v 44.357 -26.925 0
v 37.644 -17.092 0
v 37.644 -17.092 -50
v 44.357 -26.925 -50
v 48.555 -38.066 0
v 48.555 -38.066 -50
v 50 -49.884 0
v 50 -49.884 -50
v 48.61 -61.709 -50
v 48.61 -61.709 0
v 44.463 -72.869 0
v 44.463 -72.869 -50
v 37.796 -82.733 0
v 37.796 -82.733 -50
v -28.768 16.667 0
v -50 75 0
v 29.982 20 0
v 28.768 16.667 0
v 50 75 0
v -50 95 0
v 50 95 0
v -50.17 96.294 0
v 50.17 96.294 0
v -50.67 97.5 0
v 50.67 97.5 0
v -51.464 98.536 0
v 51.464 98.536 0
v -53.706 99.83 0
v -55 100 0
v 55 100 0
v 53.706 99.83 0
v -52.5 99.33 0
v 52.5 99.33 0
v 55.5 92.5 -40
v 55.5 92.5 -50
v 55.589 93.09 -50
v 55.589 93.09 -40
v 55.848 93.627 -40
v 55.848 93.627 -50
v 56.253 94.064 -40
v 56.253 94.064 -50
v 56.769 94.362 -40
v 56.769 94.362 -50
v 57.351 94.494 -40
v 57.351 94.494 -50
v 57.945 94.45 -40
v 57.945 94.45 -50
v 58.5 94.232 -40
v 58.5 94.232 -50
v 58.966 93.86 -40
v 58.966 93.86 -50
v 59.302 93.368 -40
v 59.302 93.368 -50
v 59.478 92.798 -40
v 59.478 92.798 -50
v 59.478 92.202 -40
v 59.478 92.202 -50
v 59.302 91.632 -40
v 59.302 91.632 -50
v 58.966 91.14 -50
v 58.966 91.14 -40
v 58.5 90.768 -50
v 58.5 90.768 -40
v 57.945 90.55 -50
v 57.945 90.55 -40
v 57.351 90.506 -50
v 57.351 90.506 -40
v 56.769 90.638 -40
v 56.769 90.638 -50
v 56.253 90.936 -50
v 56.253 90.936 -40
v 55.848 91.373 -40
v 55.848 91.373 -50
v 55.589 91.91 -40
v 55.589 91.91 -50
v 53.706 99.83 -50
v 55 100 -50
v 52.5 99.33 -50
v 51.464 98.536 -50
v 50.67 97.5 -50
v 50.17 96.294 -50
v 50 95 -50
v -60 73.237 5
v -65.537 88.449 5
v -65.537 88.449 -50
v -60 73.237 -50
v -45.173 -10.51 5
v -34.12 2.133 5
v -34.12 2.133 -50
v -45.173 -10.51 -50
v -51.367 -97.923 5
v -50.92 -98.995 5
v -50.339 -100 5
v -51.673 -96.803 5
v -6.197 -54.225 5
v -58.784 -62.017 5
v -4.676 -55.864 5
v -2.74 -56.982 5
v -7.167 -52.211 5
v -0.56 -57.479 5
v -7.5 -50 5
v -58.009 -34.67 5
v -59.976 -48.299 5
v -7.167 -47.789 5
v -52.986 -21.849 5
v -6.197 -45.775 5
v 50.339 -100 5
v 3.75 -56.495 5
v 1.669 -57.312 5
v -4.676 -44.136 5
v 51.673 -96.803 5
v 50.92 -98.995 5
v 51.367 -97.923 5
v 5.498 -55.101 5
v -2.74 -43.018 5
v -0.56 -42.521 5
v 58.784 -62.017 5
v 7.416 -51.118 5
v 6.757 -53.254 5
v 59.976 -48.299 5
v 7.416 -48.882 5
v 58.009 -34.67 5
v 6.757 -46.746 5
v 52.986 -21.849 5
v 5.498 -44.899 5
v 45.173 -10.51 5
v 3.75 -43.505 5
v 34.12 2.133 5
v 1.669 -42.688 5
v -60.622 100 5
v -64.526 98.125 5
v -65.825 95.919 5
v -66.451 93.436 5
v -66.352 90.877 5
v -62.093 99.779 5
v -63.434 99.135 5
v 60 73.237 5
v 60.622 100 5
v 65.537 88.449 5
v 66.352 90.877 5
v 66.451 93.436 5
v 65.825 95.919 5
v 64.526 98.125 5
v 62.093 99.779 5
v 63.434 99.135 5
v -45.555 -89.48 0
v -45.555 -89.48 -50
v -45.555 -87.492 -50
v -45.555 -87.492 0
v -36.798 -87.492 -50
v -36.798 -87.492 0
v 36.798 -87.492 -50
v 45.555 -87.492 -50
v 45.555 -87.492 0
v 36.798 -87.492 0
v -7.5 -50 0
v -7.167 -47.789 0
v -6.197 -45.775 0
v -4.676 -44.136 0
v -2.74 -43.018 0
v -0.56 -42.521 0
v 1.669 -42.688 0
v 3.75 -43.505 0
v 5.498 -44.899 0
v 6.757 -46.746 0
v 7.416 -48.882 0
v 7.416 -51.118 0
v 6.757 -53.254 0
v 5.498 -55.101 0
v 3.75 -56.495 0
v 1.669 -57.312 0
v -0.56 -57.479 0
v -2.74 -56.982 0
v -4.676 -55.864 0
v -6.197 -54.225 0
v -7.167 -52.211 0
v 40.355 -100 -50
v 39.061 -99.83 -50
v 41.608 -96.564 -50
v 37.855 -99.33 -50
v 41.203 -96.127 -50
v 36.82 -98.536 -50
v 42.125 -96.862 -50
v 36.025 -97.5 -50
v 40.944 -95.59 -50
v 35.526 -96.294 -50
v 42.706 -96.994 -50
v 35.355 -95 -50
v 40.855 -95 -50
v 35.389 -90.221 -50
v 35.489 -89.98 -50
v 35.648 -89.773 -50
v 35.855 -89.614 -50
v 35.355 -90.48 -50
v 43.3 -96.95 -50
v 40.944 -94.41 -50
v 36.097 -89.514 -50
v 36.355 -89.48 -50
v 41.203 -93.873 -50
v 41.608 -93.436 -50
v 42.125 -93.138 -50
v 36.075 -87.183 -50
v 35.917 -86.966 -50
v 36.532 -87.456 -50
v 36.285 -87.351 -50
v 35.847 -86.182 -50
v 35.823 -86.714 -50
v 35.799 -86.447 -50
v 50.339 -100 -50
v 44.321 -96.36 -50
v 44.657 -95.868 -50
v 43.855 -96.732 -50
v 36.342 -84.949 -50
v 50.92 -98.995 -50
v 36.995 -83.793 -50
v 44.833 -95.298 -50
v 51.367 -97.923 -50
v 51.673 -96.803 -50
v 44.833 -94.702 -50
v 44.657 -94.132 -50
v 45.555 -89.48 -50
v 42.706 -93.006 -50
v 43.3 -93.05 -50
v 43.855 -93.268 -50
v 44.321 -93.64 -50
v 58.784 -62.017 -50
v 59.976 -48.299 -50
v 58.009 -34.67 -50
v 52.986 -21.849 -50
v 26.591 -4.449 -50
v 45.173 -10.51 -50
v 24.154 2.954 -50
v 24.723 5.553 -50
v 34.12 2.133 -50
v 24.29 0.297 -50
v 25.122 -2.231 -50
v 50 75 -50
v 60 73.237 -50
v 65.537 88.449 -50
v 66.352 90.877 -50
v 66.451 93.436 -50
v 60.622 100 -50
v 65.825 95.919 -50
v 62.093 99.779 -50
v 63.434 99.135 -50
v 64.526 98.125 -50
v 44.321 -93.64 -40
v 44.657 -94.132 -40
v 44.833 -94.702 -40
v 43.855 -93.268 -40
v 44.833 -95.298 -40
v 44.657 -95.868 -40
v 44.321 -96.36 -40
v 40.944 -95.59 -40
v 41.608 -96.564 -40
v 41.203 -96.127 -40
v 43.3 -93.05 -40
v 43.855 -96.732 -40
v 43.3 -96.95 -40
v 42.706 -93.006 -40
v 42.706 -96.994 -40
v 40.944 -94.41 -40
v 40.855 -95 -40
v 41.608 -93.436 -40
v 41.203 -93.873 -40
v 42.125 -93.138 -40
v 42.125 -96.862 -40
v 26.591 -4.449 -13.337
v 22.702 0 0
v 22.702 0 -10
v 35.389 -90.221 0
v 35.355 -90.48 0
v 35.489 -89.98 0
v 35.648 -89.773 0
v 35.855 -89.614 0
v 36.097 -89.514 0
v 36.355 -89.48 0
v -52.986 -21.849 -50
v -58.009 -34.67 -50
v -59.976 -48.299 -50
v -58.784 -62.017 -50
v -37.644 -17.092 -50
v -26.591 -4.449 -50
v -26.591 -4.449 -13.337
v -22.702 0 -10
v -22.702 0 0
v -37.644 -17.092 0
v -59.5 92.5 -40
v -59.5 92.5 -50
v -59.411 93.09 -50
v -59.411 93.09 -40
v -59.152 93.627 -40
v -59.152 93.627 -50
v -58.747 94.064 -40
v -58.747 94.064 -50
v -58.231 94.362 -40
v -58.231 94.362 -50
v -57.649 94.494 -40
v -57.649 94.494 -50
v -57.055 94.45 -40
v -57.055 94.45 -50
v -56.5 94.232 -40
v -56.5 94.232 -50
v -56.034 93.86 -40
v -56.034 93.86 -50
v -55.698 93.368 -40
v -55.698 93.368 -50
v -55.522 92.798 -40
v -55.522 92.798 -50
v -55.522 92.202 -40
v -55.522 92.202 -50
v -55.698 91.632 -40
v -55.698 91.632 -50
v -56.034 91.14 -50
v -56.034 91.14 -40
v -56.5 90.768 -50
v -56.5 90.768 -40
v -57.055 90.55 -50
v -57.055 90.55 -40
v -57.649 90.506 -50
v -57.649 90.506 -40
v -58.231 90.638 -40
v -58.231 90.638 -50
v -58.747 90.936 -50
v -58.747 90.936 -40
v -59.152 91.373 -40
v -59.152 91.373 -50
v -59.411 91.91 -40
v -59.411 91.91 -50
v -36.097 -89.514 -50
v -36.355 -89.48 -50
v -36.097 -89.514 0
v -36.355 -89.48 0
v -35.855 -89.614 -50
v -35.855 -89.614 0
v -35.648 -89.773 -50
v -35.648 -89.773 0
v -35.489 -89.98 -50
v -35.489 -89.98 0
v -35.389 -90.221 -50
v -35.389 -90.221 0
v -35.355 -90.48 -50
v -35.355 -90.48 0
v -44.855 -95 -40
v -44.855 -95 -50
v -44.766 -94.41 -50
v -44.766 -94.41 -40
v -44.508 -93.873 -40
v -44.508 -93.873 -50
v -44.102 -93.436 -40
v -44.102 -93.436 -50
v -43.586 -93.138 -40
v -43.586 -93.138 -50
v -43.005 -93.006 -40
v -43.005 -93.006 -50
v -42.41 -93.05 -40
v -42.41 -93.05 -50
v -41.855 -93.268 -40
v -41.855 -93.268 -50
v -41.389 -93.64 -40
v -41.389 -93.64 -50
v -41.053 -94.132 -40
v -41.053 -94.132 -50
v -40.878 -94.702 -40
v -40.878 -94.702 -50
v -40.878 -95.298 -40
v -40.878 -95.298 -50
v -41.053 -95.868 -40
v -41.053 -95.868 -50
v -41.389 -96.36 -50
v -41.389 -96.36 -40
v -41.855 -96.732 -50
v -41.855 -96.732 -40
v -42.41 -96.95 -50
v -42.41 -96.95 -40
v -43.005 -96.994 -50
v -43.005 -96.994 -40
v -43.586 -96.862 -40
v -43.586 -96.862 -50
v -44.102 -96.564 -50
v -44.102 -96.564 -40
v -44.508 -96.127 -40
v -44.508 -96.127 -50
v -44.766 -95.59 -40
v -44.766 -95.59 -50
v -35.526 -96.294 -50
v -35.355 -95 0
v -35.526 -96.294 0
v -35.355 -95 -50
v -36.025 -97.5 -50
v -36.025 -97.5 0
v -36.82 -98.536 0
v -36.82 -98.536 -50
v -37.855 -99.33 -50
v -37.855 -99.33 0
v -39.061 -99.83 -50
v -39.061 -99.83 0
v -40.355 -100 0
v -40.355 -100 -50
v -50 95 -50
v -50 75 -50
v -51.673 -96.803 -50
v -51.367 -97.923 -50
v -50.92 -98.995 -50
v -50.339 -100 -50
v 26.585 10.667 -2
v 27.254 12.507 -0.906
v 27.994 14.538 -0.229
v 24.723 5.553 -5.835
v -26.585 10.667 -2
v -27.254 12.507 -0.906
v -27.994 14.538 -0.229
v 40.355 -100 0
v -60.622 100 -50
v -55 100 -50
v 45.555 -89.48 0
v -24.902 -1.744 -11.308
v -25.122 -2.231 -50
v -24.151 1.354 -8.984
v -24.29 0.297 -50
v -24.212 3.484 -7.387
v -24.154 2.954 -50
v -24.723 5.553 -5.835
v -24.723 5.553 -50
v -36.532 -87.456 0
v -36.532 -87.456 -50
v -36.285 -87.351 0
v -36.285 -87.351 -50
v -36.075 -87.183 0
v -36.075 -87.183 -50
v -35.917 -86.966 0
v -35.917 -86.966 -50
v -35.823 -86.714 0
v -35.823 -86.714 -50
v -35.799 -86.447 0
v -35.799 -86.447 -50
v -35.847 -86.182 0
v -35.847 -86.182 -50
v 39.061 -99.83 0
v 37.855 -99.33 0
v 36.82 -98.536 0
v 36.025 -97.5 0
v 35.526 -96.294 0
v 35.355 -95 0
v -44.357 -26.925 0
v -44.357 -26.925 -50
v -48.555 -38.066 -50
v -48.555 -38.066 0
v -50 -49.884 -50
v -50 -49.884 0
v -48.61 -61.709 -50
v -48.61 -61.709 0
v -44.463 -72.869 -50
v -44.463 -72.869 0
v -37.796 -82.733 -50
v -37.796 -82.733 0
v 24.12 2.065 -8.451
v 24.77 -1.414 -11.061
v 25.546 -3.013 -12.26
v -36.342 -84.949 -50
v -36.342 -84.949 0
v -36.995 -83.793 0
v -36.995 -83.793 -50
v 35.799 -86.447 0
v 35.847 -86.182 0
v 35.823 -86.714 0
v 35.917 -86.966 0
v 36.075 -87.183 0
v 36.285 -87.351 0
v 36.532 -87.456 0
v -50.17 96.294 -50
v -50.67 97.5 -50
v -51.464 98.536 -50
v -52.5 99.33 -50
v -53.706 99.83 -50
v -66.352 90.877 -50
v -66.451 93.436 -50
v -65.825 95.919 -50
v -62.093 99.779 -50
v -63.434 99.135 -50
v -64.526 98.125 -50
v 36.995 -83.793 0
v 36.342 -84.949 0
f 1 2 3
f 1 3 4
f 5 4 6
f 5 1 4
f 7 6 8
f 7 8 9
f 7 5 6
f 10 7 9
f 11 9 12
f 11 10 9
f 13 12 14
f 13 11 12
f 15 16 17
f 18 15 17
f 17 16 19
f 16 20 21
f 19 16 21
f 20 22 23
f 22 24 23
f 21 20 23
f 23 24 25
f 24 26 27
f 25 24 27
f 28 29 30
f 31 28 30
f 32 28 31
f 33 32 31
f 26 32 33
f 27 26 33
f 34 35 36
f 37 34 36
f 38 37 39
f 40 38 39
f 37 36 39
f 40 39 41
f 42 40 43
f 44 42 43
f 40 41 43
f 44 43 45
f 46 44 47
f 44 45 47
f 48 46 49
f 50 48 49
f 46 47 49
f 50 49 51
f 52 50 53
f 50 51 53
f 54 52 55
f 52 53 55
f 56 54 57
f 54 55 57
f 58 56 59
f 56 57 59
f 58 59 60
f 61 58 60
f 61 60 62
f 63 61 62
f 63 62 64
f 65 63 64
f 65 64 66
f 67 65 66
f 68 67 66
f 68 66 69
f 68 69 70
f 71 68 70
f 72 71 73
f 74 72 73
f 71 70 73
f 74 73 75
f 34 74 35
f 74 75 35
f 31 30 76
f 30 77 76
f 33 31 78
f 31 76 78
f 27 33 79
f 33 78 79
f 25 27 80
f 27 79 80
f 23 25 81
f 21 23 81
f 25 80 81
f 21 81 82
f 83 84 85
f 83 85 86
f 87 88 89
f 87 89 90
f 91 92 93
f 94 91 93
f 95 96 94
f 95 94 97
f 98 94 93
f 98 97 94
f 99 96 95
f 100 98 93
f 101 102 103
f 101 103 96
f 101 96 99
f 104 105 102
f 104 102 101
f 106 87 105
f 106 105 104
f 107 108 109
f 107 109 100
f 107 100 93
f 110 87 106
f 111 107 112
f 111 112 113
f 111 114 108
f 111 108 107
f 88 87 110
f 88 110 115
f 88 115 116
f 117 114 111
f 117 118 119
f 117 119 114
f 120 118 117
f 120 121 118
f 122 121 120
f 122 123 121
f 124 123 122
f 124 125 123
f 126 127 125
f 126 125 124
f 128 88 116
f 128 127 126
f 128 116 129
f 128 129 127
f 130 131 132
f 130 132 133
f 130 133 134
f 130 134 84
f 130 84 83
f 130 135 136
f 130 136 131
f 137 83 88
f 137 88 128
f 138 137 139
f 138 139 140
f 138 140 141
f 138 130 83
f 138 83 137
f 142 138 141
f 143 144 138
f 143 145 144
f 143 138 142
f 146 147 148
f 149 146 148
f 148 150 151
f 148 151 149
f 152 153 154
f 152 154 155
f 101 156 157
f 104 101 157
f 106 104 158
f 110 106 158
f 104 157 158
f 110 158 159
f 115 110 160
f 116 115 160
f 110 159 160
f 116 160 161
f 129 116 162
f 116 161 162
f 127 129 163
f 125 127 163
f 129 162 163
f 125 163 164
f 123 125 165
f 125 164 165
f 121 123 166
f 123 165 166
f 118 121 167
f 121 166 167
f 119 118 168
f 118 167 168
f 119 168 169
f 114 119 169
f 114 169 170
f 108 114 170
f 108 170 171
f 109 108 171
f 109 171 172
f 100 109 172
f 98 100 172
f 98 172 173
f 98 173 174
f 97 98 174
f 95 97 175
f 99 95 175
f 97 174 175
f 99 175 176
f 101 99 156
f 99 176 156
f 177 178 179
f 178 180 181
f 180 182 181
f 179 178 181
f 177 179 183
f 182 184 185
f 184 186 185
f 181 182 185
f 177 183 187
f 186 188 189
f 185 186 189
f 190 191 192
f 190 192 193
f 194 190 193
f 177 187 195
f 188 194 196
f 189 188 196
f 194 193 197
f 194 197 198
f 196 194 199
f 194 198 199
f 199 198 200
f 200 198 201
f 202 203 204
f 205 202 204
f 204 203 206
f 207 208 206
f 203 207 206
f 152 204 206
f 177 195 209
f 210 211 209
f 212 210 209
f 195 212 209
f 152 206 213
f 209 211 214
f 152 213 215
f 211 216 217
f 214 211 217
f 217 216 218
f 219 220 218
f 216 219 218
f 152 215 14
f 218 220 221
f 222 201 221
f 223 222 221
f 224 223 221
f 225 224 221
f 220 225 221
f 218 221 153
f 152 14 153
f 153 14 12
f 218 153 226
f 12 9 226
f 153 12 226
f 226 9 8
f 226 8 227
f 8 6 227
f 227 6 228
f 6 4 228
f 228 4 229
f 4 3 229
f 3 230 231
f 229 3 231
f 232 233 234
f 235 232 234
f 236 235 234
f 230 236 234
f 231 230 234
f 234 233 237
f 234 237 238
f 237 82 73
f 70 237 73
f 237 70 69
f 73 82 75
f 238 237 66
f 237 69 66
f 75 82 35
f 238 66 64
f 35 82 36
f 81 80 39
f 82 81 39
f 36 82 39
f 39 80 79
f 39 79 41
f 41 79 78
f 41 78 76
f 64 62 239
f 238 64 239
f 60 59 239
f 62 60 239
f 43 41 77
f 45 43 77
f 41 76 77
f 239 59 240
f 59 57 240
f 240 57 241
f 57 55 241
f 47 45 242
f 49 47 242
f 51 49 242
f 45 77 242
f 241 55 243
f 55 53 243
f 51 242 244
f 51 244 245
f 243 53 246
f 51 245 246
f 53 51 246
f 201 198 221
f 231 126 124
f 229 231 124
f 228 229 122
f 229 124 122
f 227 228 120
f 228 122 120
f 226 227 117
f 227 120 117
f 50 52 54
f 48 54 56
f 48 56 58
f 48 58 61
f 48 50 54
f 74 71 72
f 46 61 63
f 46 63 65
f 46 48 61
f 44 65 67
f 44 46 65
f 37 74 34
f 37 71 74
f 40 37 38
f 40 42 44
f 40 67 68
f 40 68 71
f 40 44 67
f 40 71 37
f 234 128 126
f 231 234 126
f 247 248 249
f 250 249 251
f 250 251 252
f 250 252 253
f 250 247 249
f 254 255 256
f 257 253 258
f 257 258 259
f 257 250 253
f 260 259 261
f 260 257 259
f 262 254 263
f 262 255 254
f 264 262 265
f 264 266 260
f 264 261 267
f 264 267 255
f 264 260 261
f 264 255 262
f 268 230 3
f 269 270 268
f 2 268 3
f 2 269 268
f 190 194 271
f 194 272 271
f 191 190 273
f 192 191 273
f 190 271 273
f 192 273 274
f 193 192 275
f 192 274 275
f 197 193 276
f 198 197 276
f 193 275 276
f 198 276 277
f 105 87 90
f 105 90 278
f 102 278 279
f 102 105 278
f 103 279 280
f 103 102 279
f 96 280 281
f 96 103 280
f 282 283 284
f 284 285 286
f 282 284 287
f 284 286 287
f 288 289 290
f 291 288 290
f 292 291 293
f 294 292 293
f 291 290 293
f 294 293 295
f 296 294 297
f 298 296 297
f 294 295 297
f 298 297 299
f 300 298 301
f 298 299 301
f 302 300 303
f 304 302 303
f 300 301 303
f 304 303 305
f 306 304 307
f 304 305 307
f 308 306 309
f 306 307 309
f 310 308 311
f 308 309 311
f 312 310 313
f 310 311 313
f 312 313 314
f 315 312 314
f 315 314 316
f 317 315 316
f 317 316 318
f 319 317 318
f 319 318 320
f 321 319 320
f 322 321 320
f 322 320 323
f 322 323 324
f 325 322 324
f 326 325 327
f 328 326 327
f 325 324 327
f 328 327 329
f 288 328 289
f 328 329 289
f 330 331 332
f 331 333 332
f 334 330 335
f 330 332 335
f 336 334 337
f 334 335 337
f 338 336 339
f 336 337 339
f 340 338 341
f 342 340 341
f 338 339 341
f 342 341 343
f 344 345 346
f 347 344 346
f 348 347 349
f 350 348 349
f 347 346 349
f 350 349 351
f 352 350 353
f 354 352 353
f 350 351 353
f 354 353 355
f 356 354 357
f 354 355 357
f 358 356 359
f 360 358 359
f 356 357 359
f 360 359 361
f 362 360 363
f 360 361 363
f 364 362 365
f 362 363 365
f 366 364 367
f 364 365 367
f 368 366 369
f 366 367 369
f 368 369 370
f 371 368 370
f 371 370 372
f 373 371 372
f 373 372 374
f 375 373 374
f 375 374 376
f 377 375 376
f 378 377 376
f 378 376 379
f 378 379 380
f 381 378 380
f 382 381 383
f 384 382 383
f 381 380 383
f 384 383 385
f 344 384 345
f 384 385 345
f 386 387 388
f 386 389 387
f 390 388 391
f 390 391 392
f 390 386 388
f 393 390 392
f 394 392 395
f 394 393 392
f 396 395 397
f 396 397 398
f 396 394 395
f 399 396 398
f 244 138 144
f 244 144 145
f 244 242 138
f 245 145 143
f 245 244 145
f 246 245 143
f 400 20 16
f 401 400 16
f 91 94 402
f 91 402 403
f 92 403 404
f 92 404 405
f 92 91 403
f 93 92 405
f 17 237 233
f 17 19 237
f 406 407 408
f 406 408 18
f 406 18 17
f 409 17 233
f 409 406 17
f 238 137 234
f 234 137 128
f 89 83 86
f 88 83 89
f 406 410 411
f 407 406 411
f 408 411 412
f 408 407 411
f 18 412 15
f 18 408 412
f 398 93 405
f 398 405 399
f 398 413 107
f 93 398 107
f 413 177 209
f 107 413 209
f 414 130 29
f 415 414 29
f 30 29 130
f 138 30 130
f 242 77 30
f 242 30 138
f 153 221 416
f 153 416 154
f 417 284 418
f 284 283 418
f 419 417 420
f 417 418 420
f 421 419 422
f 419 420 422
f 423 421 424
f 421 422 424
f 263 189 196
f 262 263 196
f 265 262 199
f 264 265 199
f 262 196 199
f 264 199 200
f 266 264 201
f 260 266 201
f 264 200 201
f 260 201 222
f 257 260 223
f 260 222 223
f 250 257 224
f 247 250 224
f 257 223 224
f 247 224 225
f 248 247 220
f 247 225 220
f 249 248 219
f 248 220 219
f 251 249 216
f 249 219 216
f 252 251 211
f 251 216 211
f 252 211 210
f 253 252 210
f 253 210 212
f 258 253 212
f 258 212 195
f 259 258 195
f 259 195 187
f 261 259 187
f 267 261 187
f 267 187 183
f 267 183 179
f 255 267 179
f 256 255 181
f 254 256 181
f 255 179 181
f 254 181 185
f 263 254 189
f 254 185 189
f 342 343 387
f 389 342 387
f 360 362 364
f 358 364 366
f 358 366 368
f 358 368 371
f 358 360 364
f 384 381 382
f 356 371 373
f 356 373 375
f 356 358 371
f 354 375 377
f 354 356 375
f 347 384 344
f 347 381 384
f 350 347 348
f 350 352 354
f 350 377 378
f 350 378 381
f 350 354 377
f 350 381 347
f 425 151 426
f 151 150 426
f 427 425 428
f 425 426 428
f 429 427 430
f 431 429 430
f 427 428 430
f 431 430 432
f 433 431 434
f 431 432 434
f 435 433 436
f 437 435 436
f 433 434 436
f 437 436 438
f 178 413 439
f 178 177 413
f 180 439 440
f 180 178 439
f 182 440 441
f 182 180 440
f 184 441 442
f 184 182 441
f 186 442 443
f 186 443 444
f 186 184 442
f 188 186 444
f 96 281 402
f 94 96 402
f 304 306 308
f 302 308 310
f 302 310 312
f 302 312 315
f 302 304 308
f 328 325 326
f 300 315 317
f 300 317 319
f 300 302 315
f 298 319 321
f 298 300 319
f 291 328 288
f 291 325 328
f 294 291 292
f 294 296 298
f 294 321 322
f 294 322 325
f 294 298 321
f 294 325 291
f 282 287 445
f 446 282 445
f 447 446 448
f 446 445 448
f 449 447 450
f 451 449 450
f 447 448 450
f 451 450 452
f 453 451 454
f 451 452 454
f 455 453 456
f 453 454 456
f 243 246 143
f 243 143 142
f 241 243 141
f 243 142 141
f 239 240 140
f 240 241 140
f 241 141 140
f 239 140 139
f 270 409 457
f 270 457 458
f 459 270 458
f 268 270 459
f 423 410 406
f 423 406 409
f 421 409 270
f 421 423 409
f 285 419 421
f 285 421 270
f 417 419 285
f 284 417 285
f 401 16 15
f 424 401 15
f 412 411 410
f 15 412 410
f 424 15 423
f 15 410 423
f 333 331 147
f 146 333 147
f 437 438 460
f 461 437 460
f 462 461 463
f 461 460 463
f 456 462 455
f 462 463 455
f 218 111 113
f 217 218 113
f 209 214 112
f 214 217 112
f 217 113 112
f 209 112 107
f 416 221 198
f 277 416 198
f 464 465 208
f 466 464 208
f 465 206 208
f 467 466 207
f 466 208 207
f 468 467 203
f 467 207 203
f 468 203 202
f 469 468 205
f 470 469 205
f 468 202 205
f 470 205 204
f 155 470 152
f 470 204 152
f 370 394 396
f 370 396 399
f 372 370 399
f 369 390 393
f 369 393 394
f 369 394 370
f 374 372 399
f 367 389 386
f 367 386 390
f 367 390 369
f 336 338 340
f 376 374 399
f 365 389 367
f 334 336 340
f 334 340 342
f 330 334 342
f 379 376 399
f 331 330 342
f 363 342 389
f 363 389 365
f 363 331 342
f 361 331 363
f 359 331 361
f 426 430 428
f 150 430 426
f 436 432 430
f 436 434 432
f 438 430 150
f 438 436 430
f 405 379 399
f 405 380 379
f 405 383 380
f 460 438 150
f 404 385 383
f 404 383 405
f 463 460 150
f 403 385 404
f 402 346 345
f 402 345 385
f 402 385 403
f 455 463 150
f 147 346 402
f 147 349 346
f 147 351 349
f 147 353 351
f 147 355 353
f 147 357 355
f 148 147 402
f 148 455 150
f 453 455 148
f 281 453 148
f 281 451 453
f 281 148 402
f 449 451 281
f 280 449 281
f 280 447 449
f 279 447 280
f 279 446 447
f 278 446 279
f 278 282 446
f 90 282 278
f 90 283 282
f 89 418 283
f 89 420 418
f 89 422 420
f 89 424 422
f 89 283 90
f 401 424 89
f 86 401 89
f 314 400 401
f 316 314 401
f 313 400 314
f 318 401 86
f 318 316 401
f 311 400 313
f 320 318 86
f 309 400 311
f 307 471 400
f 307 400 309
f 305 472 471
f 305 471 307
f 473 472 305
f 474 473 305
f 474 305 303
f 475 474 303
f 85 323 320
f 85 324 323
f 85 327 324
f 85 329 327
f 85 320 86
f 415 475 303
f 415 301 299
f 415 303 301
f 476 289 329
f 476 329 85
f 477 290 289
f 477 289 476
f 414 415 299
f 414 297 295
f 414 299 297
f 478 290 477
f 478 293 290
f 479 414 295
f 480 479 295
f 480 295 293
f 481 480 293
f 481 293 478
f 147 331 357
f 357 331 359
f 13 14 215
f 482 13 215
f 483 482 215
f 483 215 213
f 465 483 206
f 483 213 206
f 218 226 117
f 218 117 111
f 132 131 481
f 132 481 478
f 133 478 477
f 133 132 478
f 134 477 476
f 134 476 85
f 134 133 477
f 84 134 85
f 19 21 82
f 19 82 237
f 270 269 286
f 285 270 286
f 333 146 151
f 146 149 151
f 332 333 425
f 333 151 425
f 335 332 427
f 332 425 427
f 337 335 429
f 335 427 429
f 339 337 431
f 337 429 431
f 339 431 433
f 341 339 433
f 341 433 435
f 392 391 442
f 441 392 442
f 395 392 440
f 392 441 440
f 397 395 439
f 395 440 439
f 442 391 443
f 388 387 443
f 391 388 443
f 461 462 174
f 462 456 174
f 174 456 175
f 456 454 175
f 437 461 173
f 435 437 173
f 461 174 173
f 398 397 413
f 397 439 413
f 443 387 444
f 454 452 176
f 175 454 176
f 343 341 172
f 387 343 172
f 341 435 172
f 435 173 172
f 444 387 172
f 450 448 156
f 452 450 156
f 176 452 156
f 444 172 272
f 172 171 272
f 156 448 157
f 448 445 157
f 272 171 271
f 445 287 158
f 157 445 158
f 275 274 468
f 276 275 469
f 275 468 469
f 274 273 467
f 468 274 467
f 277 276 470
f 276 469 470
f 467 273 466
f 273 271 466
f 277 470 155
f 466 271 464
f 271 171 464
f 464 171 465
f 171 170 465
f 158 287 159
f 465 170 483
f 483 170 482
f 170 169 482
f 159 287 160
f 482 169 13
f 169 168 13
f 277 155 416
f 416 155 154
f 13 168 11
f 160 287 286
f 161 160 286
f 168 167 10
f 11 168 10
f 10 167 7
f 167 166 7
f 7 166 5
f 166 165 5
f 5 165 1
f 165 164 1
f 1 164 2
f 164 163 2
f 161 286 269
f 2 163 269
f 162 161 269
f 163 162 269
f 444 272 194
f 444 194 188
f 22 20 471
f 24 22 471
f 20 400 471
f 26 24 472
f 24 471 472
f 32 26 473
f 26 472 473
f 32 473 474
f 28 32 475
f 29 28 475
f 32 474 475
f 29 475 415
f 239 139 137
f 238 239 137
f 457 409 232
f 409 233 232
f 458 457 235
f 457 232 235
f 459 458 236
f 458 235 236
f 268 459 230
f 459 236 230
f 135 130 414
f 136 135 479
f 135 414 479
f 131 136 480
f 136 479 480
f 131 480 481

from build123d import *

# Parameters (mm, degrees)
BOSS_EXTRUDE1_DEPTH     = 50
BOSS_EXTRUDE1_2_DEPTH   = 50
BOSS_EXTRUDE2_DEPTH     = 10
CHAMFER1_SIZE           = 15
CHAMFER1_SIZE_2         = 20
SKETCH4_W               = 160
SKETCH4_H               = 200
BOSS_EXTRUDE3_DEPTH     = 5
FILLET1_R               = 10
SKETCH5_R               = 7.5
CUT_EXTRUDE1_DEPTH      = 5
CUT_EXTRUDE5_DEPTH      = 140.373598648
CUT_EXTRUDE5_DEPTH_BACK = 140.373598648
FILLET4_R               = 5
SKETCH12_R              = 2
CUT_EXTRUDE6_DEPTH      = 10
SKETCH13_W              = 22.9
SKETCH13_H              = 1.9875
CUT_EXTRUDE7_DEPTH      = 50
FILLET5_R               = 1


with BuildPart() as part:
    # Sketch2 → Boss-Extrude1 (new body)
    with BuildSketch(Plane.XY):
        with BuildLine():
            Line((-50, 75), (-22.70223243, 0))
            Line((-22.70223243, 0), (-37.64392369, -17.092022104))
            ThreePointArc((-37.64392369, -17.092022104), (-49.971924127, -51.675350432), (-35.355339059, -85.355339059))
            Line((-35.355339059, -85.355339059), (-35.355339059, -100))
            Line((-35.355339059, -100), (-80, -100))
            Line((-80, -100), (-80, 100))
            Line((-80, 100), (-50, 100))
            Line((-50, 100), (-50, 75))
        make_face()
    extrude(amount=-BOSS_EXTRUDE1_DEPTH)



with BuildPart() as body_2:
    # Sketch2 → Boss-Extrude1 2 (new body)
    with BuildSketch(Plane.XY):
        with BuildLine():
            Line((50, 75), (22.70223243, 0))
            Line((22.70223243, 0), (37.64392369, -17.092022104))
            ThreePointArc((37.64392369, -17.092022104), (49.971924127, -51.675350432), (35.355339059, -85.355339059))
            Line((35.355339059, -85.355339059), (35.355339059, -100))
            Line((35.355339059, -100), (80, -100))
            Line((80, -100), (80, 100))
            Line((80, 100), (50, 100))
            Line((50, 100), (50, 75))
        make_face()
    extrude(amount=-BOSS_EXTRUDE1_2_DEPTH)


with BuildPart() as part_1:
    add(part.part)

    add(body_2.part)  # Boss-Extrude2 merges body 2
    # Sketch3 → Boss-Extrude2 (add)
    with BuildSketch(Plane.XY):
        Polygon((-29.981637115, 20), (29.981637115, 20), (22.70223243, 0), (-22.70223243, 0), align=None)
    extrude(amount=-BOSS_EXTRUDE2_DEPTH)

    # Chamfer1
    # the kernel refuses this chamfer: 20, 15 mm, written as the material it takes off along each edge
    with BuildSketch(Plane(origin=(-81.595588718, 20, -10), x_dir=(0, 0.041308380137954244, 0.9991464445867674), z_dir=(1, 0, 0))) as chamfer1_piece_1_section:
        Polygon((CHAMFER1_SIZE * 0.999146444587, CHAMFER1_SIZE * 0.041308380138), (-CHAMFER1_SIZE_2 * 0.041308380138, CHAMFER1_SIZE_2 * 0.999146444587), (0, 0), align=None)
    chamfer1_piece_1 = extrude(amount=163.191177435, mode=Mode.PRIVATE)
    chamfer1_piece_1 = split(chamfer1_piece_1, bisect_by=Plane(origin=(-24.447399798, 4.794807938, -4.975922198), z_dir=(0.9396926207859094, 0.3420201433256661, 0)), keep=Keep.TOP, mode=Mode.PRIVATE)
    chamfer1_piece_1 = split(chamfer1_piece_1, bisect_by=Plane(origin=(24.447399798, 4.794807938, -4.975922198), z_dir=(-0.939692620785907, 0.34202014332567265, 0)), keep=Keep.TOP, mode=Mode.PRIVATE)
    add(chamfer1_piece_1, mode=Mode.SUBTRACT)

    # Sketch4 → Boss-Extrude3 (add)
    with BuildSketch(Plane.XY):
        Rectangle(SKETCH4_W, SKETCH4_H)
    extrude(amount=BOSS_EXTRUDE3_DEPTH)

    # Fillet1
    fillet1_edges = [part_1.edges().sort_by_distance(p)[0] for p in [
        (-22.70223243, 0, -30),
        (-35.355339059, -85.355339059, -25),
        (35.355339059, -85.355339059, -25),
        (22.70223243, 0, -30),
        (0, 13.333333333, 0),
    ]]
    fillet(fillet1_edges, radius=FILLET1_R)

    # Sketch5 → Cut-Extrude1 (cut)
    with BuildSketch(Plane(origin=(0, 0, 0), x_dir=(-1, 0, 0), z_dir=(0, 0, -1))):
        with Locations((0, -50)):
            Circle(SKETCH5_R)
    extrude(amount=-CUT_EXTRUDE1_DEPTH, mode=Mode.SUBTRACT)

    # Sketch11 → Cut-Extrude5 (cut, two sides: drawn at the far end of the back side and taken through both)
    with BuildSketch(Plane(origin=(0, 0, -50), x_dir=(-1, 0, 0), z_dir=(0, 0, -1)).offset(-CUT_EXTRUDE5_DEPTH_BACK)):
        with BuildLine():
            Line((-58.784198233, -62.017405631), (-51.672968794, -96.802610845))
            ThreePointArc((-51.672968794, -96.802610845), (-51.161121522, -98.466118532), (-50.338653833, -100))
            Line((-50.338653833, -100), (-80, -100))
            Line((-80, -100), (-80, 100))
            Line((-80, 100), (-62.474937186, 100))
            ThreePointArc((-62.474937186, 100), (-66.199502533, 94.806221081), (-65.536970349, 88.4494312))
            Line((-65.536970349, 88.4494312), (-60, 73.236730193))
            Line((-60, 73.236730193), (-34.120235365, 2.132661237))
            Line((-34.120235365, 2.132661237), (-45.172708428, -10.510426525))
            ThreePointArc((-45.172708428, -10.510426525), (-58.008635864, -34.670350128), (-58.784198233, -62.017405631))
        make_face()
        with BuildLine():
            Line((34.120235365, 2.132661237), (45.172708428, -10.510426525))
            ThreePointArc((45.172708428, -10.510426525), (58.008635864, -34.670350128), (58.784198233, -62.017405631))
            Line((58.784198233, -62.017405631), (51.672968794, -96.802610845))
            ThreePointArc((51.672968794, -96.802610845), (51.161121522, -98.466118532), (50.338653833, -100))
            Line((50.338653833, -100), (80, -100))
            Line((80, -100), (80, 100))
            Line((80, 100), (62.474937186, 100))
            ThreePointArc((62.474937186, 100), (66.199502533, 94.806221081), (65.536970349, 88.4494312))
            Line((65.536970349, 88.4494312), (60, 73.236730193))
            Line((60, 73.236730193), (34.120235365, 2.132661237))
        make_face()
    extrude(amount=CUT_EXTRUDE5_DEPTH + CUT_EXTRUDE5_DEPTH_BACK, mode=Mode.SUBTRACT)

    # Fillet4
    fillet4_edges = [part_1.edges().sort_by_distance(p)[0] for p in [
        (-35.355339059, -100, -25),
        (-50, 100, -25),
        (62.474937186, 100, -22.5),
        (-62.474937186, 100, -22.5),
        (50, 100, -25),
        (35.355339059, -100, -25),
    ]]
    fillet(fillet4_edges, radius=FILLET4_R)

    # Sketch12 → Cut-Extrude6 (cut)
    with BuildSketch(Plane(origin=(0, 0, -50), x_dir=(-1, 0, 0), z_dir=(0, 0, -1))):
        with Locations((-57.5, 92.5)):
            Circle(SKETCH12_R)
        with Locations((57.5, 92.5)):
            Circle(SKETCH12_R)
        with Locations((-42.855339059, -95)):
            Circle(SKETCH12_R)
        with Locations((42.855339059, -95)):
            Circle(SKETCH12_R)
    extrude(amount=-CUT_EXTRUDE6_DEPTH, mode=Mode.SUBTRACT)

    # Sketch13 → Cut-Extrude7 (cut)
    with BuildSketch(Plane(origin=(0, 0, -50), x_dir=(-1, 0, 0), z_dir=(0, 0, -1))):
        with Locations((-34.105339059, -88.485929464)):
            Rectangle(SKETCH13_W, SKETCH13_H)
        with Locations((34.105339059, -88.485929464)):
            Rectangle(SKETCH13_W, SKETCH13_H)
    extrude(amount=-CUT_EXTRUDE7_DEPTH, mode=Mode.SUBTRACT)

    # Fillet5
    fillet5_edges = [part_1.edges().sort_by_distance(p)[0] for p in [
        (-35.516393803, -87.492179464, -25),
        (35.516393803, -87.492179464, -25),
        (35.355339059, -89.479679464, -25),
        (-35.355339059, -89.479679464, -25),
    ]]
    fillet(fillet5_edges, radius=FILLET5_R)


solid = part_1.part
